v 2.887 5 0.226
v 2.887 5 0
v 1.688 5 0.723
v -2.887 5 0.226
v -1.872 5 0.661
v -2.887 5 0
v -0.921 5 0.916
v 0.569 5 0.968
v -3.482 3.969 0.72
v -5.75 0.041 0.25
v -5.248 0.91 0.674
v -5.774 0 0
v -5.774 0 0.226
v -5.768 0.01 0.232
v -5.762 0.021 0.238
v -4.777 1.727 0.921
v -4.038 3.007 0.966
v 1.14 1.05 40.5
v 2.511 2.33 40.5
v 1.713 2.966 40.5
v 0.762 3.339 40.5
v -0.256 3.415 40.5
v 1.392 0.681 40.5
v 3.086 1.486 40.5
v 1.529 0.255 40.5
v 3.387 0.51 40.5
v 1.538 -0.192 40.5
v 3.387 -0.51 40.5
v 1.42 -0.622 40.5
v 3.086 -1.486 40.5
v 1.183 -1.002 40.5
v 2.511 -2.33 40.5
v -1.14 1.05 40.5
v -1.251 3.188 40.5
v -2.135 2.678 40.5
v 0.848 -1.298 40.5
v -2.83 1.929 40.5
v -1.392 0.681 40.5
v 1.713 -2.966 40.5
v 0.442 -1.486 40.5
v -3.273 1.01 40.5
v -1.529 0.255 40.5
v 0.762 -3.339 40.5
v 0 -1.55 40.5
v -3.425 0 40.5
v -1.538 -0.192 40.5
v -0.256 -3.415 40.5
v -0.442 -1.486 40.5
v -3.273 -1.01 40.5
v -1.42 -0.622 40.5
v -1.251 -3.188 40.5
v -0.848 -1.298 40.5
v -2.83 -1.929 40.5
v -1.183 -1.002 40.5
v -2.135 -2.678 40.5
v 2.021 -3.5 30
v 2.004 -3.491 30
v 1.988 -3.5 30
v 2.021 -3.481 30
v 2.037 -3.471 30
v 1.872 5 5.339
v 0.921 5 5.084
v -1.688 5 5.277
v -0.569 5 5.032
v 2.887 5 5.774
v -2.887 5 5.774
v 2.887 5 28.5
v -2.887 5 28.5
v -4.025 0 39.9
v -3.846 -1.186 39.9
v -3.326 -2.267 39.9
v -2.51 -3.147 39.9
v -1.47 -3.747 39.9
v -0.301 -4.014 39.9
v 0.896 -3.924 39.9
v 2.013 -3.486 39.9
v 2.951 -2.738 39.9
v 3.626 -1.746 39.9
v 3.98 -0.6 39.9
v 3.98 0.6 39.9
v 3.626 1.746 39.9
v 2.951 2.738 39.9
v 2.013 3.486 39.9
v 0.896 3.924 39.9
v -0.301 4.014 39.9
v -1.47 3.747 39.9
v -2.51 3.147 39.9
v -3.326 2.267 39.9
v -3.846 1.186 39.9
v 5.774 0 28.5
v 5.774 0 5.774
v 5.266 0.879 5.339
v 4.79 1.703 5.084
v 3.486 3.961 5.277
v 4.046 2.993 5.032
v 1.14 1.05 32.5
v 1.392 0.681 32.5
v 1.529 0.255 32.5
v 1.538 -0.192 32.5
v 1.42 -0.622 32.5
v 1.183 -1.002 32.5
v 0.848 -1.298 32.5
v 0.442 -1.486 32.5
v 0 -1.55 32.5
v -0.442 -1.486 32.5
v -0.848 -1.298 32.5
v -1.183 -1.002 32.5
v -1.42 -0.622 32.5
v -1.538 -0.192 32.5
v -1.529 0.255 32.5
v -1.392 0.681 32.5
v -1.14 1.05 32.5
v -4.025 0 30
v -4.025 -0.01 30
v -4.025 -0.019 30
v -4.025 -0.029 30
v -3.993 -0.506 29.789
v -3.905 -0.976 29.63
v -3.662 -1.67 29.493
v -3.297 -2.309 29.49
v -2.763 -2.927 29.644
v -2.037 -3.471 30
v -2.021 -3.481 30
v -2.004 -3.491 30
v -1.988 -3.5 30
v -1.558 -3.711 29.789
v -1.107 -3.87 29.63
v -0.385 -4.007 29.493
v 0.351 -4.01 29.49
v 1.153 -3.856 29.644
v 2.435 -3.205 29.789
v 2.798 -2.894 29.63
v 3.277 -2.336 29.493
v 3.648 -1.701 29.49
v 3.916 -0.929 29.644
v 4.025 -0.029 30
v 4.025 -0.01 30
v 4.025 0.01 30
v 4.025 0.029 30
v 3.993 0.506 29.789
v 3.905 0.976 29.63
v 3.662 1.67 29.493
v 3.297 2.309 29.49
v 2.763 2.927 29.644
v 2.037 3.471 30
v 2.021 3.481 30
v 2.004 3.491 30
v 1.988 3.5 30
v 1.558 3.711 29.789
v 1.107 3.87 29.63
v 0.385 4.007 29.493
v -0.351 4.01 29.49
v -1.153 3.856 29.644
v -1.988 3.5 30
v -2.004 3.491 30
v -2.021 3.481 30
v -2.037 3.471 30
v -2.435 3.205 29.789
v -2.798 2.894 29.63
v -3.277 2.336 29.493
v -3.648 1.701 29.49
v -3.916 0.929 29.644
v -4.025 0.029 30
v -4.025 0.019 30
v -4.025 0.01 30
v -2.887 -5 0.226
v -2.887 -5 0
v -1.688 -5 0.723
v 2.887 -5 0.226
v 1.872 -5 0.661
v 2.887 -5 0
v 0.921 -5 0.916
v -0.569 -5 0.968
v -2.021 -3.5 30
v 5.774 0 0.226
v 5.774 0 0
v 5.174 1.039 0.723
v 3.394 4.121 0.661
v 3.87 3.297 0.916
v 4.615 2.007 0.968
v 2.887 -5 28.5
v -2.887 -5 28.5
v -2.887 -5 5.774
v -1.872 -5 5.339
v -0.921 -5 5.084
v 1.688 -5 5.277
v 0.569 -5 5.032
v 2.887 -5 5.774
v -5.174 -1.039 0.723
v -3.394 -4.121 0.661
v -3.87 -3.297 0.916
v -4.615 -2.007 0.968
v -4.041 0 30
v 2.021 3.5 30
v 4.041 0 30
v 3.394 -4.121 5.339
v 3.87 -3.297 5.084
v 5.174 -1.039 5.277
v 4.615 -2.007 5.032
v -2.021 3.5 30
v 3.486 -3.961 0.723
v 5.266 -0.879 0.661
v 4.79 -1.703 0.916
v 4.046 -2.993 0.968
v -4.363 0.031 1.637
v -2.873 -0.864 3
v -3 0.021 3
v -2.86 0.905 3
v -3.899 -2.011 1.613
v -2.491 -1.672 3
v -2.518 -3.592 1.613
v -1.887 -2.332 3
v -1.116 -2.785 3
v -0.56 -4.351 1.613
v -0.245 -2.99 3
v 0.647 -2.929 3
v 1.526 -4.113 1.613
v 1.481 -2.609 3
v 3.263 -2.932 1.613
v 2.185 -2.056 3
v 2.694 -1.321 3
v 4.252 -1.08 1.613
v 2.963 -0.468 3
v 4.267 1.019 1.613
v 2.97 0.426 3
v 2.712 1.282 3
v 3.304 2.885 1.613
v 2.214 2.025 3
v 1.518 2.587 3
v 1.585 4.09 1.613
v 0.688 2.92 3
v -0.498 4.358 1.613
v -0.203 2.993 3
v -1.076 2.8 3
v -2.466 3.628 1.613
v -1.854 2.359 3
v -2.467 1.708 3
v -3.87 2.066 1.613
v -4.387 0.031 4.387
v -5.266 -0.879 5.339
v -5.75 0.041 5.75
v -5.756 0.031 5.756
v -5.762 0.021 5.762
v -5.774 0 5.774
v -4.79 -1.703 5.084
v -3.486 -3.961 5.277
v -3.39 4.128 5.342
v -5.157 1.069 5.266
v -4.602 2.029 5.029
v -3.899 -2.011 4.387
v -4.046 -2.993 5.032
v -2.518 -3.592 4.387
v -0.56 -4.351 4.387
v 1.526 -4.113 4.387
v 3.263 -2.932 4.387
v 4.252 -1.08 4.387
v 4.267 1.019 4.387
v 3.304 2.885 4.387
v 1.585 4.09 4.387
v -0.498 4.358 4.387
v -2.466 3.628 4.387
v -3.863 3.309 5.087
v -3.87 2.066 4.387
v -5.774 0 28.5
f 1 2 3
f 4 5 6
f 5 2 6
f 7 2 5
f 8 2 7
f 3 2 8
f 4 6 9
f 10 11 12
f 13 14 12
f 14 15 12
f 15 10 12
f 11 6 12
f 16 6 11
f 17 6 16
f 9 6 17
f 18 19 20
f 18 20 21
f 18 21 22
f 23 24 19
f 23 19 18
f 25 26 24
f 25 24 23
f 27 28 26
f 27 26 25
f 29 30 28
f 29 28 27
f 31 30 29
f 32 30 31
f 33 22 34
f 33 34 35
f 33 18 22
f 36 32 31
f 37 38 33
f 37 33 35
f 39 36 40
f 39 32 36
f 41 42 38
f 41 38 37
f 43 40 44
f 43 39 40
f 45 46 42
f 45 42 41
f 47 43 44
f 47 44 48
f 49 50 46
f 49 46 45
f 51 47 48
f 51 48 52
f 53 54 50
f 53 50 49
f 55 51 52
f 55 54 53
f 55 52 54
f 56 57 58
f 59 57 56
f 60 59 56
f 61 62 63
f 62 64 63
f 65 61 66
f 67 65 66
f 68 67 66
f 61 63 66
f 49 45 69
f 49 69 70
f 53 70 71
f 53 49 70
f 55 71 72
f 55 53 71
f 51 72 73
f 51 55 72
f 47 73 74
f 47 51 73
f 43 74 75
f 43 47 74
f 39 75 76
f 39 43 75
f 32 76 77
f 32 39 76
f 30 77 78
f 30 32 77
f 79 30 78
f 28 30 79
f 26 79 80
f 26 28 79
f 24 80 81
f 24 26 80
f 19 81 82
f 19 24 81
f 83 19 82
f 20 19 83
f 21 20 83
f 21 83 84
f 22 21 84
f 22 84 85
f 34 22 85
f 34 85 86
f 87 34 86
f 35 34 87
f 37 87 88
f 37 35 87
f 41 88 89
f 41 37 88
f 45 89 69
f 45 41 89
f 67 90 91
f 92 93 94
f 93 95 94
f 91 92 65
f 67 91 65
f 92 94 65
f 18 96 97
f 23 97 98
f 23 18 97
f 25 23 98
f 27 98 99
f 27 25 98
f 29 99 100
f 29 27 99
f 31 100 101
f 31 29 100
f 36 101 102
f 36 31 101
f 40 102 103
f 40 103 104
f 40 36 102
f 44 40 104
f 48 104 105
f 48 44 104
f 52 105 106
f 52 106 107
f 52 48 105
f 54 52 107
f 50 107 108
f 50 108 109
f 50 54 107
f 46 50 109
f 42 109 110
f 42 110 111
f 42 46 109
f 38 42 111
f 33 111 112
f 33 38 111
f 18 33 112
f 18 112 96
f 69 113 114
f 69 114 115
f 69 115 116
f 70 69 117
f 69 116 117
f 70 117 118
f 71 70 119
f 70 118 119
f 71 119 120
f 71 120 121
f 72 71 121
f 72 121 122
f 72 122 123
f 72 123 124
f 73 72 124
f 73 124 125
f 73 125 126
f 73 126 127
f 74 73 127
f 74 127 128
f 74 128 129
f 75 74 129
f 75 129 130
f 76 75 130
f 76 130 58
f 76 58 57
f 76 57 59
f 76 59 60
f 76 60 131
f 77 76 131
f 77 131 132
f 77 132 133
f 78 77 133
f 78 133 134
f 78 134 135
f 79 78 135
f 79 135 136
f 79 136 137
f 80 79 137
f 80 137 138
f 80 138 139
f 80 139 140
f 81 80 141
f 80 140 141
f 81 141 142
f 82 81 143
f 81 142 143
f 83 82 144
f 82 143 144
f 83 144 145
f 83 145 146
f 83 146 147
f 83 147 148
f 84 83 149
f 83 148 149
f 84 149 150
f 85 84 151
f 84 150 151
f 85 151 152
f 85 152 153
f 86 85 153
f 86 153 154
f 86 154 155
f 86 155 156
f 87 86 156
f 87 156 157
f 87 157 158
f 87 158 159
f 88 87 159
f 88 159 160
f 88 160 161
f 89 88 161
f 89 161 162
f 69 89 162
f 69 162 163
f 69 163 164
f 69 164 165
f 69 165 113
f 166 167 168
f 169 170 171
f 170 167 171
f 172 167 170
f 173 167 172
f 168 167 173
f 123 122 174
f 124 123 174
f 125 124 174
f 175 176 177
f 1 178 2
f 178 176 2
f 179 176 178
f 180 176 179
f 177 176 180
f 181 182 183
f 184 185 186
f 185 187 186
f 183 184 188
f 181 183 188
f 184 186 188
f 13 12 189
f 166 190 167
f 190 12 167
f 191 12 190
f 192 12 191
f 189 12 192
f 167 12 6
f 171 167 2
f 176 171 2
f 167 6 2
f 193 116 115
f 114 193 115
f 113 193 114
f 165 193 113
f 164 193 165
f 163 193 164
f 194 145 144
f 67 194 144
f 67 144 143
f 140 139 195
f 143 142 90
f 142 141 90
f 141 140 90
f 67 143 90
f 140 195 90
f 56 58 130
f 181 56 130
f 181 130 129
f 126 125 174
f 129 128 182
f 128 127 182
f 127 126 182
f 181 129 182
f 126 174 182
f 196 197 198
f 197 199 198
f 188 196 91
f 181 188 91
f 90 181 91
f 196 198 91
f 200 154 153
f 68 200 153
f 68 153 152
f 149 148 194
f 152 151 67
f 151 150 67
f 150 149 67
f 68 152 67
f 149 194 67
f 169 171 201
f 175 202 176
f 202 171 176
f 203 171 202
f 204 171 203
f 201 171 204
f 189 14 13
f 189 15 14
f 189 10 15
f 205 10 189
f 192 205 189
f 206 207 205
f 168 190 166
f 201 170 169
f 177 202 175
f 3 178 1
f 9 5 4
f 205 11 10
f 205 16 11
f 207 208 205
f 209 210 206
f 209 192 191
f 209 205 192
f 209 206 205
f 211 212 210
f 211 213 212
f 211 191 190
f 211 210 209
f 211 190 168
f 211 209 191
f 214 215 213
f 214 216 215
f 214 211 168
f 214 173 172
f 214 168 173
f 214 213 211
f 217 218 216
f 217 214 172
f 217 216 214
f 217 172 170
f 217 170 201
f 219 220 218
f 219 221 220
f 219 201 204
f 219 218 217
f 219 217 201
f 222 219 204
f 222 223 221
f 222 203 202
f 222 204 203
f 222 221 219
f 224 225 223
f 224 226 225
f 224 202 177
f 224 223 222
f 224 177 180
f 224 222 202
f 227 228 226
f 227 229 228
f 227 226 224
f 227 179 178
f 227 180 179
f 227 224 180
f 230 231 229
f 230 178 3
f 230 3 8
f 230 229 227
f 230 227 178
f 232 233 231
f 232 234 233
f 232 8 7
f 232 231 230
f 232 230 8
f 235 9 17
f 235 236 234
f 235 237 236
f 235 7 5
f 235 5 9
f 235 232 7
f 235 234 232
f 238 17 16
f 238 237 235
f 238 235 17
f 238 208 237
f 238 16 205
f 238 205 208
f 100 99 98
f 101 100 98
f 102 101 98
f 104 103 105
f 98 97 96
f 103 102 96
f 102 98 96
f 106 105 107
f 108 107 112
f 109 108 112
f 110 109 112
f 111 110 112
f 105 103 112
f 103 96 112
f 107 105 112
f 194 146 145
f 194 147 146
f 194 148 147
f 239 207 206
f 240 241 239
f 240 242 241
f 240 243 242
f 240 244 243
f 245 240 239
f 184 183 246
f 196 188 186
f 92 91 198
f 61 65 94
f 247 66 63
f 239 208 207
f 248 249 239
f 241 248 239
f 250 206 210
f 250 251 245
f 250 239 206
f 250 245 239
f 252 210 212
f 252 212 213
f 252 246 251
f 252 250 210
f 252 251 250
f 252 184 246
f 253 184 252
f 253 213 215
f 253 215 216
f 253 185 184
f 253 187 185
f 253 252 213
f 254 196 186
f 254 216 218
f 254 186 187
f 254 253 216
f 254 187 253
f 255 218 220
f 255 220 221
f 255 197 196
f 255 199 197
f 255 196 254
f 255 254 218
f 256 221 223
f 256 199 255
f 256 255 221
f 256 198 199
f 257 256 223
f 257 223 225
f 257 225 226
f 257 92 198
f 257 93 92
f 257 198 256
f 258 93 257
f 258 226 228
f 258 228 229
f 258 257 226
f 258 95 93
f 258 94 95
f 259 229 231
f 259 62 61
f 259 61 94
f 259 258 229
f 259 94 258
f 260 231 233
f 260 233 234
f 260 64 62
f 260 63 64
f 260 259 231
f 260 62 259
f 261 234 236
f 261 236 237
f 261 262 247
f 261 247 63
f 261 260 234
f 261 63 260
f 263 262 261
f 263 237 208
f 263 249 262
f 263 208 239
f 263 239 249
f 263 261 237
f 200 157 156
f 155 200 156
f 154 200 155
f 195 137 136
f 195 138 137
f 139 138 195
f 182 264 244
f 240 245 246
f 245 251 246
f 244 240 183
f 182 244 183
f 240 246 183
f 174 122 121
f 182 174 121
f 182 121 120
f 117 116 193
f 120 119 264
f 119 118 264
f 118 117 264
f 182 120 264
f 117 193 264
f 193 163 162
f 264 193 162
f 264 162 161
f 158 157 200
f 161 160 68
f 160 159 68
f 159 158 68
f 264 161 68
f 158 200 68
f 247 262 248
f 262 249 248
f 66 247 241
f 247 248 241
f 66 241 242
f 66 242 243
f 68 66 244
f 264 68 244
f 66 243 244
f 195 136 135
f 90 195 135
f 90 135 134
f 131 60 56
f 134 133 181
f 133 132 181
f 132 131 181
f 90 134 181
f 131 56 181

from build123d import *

# Parameters (mm, degrees)
EXTRUDE_1_DEPTH     = 30
SKETCH_2_R          = 4.025
EXTRUDE_2_DEPTH     = 10.5
CHAMFER_1_SIZE      = 0.6
CUT_EXTRUDE_1_DEPTH = 8
CHAMFER_2_SIZE      = 1.5


with BuildPart() as part:
    # 草图1 → 凸台-拉伸1 (new body)
    with BuildSketch(Plane.XY):
        Polygon((5.773502692, 0), (2.886751346, 5), (-2.886751346, 5), (-5.773502692, 0), (-2.886751346, -5), (2.886751346, -5), align=None)
    extrude(amount=EXTRUDE_1_DEPTH)

    # 草图2 → 凸台-拉伸2 (add)
    with BuildSketch(Plane.XY.offset(30)):
        with Locations(Location((0, 0, 0), (0, 0, 180))):
            Circle(SKETCH_2_R)
    extrude(amount=EXTRUDE_2_DEPTH)

    # 倒角1
    chamfer_1_edges = [part.edges().sort_by_distance(p)[0] for p in [
        (4.025, 0, 40.5),
    ]]
    chamfer(chamfer_1_edges, length=CHAMFER_1_SIZE)

    # 草图3 → 切除-拉伸1 (cut)
    with BuildSketch(Plane.XY.offset(40.5)):
        with BuildLine():
            Line((-1.140175425, 1.05), (1.140175425, 1.05))
            ThreePointArc((1.140175425, 1.05), (0, -1.55), (-1.140175425, 1.05))
        make_face()
    extrude(amount=-CUT_EXTRUDE_1_DEPTH, mode=Mode.SUBTRACT)

    # 倒角2
    # the kernel refuses this chamfer: 1.5 mm, written as the material it takes off along each edge
    with BuildSketch(Plane(origin=(6.744275828, 5, 30), x_dir=(3.229355886475551e-15, -0.9996219169112968, 0.027495876610586775), z_dir=(-1, 0, 0))) as chamfer_2_piece_1_section:
        Polygon((CHAMFER_2_SIZE * 0.999621916911, -CHAMFER_2_SIZE * 0.0274958766106), (-CHAMFER_2_SIZE * 0.0274958766106, -CHAMFER_2_SIZE * 0.999621916911), (0, 0), align=None)
    chamfer_2_piece_1 = extrude(amount=13.488551656, mode=Mode.PRIVATE)
    chamfer_2_piece_1 = chamfer_2_piece_1 - Plane(origin=(0, 0, 29.496283425), x_dir=(-1, 0, 0), z_dir=(0, 0, -1)) * Cylinder(4.025, 33, mode=Mode.PRIVATE)
    add(chamfer_2_piece_1, mode=Mode.SUBTRACT)
    with BuildSketch(Plane(origin=(-0.957989105, 8.340714197, 30), x_dir=(0.865697974224883, -0.49981095845564333, 0.02749587661058677), z_dir=(-0.49999999999999506, -0.8660254037844416, 0))) as chamfer_2_piece_2_section:
        Polygon((CHAMFER_2_SIZE * 0.999621916911, -CHAMFER_2_SIZE * 0.0274958766106), (-CHAMFER_2_SIZE * 0.0274958766106, -CHAMFER_2_SIZE * 0.999621916911), (0, 0), align=None)
    chamfer_2_piece_2 = extrude(amount=13.488551656, mode=Mode.PRIVATE)
    chamfer_2_piece_2 = chamfer_2_piece_2 - Plane(origin=(0, 0, 29.496283425), x_dir=(-1, 0, 0), z_dir=(0, 0, -1)) * Cylinder(4.025, 33, mode=Mode.PRIVATE)
    add(chamfer_2_piece_2, mode=Mode.SUBTRACT)
    with BuildSketch(Plane(origin=(-7.702264933, 3.340714197, 30), x_dir=(0.8656979742248763, 0.49981095845565543, 0.02749587661058678), z_dir=(0.5000000000000071, -0.8660254037844346, 0))) as chamfer_2_piece_3_section:
        Polygon((CHAMFER_2_SIZE * 0.999621916911, -CHAMFER_2_SIZE * 0.0274958766106), (-CHAMFER_2_SIZE * 0.0274958766106, -CHAMFER_2_SIZE * 0.999621916911), (0, 0), align=None)
    chamfer_2_piece_3 = extrude(amount=13.488551656, mode=Mode.PRIVATE)
    chamfer_2_piece_3 = chamfer_2_piece_3 - Plane(origin=(0, 0, 29.496283426), x_dir=(-1, 0, 0), z_dir=(0, 0, -1)) * Cylinder(4.025, 33, mode=Mode.PRIVATE)
    add(chamfer_2_piece_3, mode=Mode.SUBTRACT)
    with BuildSketch(Plane(origin=(-6.744275828, -5, 30), x_dir=(-1.061074076984824e-14, 0.9996219169112968, 0.027495876610586775), z_dir=(1, 0, 0))) as chamfer_2_piece_4_section:
        Polygon((CHAMFER_2_SIZE * 0.999621916911, -CHAMFER_2_SIZE * 0.0274958766106), (-CHAMFER_2_SIZE * 0.0274958766106, -CHAMFER_2_SIZE * 0.999621916911), (0, 0), align=None)
    chamfer_2_piece_4 = extrude(amount=13.488551656, mode=Mode.PRIVATE)
    chamfer_2_piece_4 = chamfer_2_piece_4 - Plane(origin=(0, 0, 29.496283425), x_dir=(-1, 0, 0), z_dir=(0, 0, -1)) * Cylinder(4.025, 33, mode=Mode.PRIVATE)
    add(chamfer_2_piece_4, mode=Mode.SUBTRACT)
    with BuildSketch(Plane(origin=(0.957989105, -8.340714197, 30), x_dir=(-0.865697974224883, 0.49981095845564333, 0.02749587661058677), z_dir=(0.49999999999999506, 0.8660254037844416, 0))) as chamfer_2_piece_5_section:
        Polygon((CHAMFER_2_SIZE * 0.999621916911, -CHAMFER_2_SIZE * 0.0274958766106), (-CHAMFER_2_SIZE * 0.0274958766106, -CHAMFER_2_SIZE * 0.999621916911), (0, 0), align=None)
    chamfer_2_piece_5 = extrude(amount=13.488551656, mode=Mode.PRIVATE)
    chamfer_2_piece_5 = chamfer_2_piece_5 - Plane(origin=(0, 0, 29.496283425), x_dir=(-1, 0, 0), z_dir=(0, 0, -1)) * Cylinder(4.025, 33, mode=Mode.PRIVATE)
    add(chamfer_2_piece_5, mode=Mode.SUBTRACT)
    with BuildSketch(Plane(origin=(7.702264933, -3.340714197, 30), x_dir=(-0.8656979742248796, -0.4998109584556494, 0.02749587661058677), z_dir=(-0.5000000000000011, 0.866025403784438, 0))) as chamfer_2_piece_6_section:
        Polygon((CHAMFER_2_SIZE * 0.999621916911, -CHAMFER_2_SIZE * 0.0274958766106), (-CHAMFER_2_SIZE * 0.0274958766106, -CHAMFER_2_SIZE * 0.999621916911), (0, 0), align=None)
    chamfer_2_piece_6 = extrude(amount=13.488551656, mode=Mode.PRIVATE)
    chamfer_2_piece_6 = chamfer_2_piece_6 - Plane(origin=(0, 0, 29.496283425), x_dir=(-1, 0, 0), z_dir=(0, 0, -1)) * Cylinder(4.025, 33, mode=Mode.PRIVATE)
    add(chamfer_2_piece_6, mode=Mode.SUBTRACT)

    # 草图4 → 切除-旋转4 (revolve, cut)
    with BuildSketch(Plane(origin=(0, 0, 0), x_dir=(0, 0, -1), z_dir=(1, 0, 0)), mode=Mode.PRIVATE) as cut_revolve_4_sk:
        Polygon((-6.5, 6.5), (0.5, 6.5), (-3, 3), align=None)
    revolve(cut_revolve_4_sk.sketch.rotate(Axis((0, 0, -6.39558723), (0, 0, 1)), 89.591845794), axis=Axis((0, 0, -6.39558723), (0, 0, 1)), mode=Mode.SUBTRACT)


solid = part.part
